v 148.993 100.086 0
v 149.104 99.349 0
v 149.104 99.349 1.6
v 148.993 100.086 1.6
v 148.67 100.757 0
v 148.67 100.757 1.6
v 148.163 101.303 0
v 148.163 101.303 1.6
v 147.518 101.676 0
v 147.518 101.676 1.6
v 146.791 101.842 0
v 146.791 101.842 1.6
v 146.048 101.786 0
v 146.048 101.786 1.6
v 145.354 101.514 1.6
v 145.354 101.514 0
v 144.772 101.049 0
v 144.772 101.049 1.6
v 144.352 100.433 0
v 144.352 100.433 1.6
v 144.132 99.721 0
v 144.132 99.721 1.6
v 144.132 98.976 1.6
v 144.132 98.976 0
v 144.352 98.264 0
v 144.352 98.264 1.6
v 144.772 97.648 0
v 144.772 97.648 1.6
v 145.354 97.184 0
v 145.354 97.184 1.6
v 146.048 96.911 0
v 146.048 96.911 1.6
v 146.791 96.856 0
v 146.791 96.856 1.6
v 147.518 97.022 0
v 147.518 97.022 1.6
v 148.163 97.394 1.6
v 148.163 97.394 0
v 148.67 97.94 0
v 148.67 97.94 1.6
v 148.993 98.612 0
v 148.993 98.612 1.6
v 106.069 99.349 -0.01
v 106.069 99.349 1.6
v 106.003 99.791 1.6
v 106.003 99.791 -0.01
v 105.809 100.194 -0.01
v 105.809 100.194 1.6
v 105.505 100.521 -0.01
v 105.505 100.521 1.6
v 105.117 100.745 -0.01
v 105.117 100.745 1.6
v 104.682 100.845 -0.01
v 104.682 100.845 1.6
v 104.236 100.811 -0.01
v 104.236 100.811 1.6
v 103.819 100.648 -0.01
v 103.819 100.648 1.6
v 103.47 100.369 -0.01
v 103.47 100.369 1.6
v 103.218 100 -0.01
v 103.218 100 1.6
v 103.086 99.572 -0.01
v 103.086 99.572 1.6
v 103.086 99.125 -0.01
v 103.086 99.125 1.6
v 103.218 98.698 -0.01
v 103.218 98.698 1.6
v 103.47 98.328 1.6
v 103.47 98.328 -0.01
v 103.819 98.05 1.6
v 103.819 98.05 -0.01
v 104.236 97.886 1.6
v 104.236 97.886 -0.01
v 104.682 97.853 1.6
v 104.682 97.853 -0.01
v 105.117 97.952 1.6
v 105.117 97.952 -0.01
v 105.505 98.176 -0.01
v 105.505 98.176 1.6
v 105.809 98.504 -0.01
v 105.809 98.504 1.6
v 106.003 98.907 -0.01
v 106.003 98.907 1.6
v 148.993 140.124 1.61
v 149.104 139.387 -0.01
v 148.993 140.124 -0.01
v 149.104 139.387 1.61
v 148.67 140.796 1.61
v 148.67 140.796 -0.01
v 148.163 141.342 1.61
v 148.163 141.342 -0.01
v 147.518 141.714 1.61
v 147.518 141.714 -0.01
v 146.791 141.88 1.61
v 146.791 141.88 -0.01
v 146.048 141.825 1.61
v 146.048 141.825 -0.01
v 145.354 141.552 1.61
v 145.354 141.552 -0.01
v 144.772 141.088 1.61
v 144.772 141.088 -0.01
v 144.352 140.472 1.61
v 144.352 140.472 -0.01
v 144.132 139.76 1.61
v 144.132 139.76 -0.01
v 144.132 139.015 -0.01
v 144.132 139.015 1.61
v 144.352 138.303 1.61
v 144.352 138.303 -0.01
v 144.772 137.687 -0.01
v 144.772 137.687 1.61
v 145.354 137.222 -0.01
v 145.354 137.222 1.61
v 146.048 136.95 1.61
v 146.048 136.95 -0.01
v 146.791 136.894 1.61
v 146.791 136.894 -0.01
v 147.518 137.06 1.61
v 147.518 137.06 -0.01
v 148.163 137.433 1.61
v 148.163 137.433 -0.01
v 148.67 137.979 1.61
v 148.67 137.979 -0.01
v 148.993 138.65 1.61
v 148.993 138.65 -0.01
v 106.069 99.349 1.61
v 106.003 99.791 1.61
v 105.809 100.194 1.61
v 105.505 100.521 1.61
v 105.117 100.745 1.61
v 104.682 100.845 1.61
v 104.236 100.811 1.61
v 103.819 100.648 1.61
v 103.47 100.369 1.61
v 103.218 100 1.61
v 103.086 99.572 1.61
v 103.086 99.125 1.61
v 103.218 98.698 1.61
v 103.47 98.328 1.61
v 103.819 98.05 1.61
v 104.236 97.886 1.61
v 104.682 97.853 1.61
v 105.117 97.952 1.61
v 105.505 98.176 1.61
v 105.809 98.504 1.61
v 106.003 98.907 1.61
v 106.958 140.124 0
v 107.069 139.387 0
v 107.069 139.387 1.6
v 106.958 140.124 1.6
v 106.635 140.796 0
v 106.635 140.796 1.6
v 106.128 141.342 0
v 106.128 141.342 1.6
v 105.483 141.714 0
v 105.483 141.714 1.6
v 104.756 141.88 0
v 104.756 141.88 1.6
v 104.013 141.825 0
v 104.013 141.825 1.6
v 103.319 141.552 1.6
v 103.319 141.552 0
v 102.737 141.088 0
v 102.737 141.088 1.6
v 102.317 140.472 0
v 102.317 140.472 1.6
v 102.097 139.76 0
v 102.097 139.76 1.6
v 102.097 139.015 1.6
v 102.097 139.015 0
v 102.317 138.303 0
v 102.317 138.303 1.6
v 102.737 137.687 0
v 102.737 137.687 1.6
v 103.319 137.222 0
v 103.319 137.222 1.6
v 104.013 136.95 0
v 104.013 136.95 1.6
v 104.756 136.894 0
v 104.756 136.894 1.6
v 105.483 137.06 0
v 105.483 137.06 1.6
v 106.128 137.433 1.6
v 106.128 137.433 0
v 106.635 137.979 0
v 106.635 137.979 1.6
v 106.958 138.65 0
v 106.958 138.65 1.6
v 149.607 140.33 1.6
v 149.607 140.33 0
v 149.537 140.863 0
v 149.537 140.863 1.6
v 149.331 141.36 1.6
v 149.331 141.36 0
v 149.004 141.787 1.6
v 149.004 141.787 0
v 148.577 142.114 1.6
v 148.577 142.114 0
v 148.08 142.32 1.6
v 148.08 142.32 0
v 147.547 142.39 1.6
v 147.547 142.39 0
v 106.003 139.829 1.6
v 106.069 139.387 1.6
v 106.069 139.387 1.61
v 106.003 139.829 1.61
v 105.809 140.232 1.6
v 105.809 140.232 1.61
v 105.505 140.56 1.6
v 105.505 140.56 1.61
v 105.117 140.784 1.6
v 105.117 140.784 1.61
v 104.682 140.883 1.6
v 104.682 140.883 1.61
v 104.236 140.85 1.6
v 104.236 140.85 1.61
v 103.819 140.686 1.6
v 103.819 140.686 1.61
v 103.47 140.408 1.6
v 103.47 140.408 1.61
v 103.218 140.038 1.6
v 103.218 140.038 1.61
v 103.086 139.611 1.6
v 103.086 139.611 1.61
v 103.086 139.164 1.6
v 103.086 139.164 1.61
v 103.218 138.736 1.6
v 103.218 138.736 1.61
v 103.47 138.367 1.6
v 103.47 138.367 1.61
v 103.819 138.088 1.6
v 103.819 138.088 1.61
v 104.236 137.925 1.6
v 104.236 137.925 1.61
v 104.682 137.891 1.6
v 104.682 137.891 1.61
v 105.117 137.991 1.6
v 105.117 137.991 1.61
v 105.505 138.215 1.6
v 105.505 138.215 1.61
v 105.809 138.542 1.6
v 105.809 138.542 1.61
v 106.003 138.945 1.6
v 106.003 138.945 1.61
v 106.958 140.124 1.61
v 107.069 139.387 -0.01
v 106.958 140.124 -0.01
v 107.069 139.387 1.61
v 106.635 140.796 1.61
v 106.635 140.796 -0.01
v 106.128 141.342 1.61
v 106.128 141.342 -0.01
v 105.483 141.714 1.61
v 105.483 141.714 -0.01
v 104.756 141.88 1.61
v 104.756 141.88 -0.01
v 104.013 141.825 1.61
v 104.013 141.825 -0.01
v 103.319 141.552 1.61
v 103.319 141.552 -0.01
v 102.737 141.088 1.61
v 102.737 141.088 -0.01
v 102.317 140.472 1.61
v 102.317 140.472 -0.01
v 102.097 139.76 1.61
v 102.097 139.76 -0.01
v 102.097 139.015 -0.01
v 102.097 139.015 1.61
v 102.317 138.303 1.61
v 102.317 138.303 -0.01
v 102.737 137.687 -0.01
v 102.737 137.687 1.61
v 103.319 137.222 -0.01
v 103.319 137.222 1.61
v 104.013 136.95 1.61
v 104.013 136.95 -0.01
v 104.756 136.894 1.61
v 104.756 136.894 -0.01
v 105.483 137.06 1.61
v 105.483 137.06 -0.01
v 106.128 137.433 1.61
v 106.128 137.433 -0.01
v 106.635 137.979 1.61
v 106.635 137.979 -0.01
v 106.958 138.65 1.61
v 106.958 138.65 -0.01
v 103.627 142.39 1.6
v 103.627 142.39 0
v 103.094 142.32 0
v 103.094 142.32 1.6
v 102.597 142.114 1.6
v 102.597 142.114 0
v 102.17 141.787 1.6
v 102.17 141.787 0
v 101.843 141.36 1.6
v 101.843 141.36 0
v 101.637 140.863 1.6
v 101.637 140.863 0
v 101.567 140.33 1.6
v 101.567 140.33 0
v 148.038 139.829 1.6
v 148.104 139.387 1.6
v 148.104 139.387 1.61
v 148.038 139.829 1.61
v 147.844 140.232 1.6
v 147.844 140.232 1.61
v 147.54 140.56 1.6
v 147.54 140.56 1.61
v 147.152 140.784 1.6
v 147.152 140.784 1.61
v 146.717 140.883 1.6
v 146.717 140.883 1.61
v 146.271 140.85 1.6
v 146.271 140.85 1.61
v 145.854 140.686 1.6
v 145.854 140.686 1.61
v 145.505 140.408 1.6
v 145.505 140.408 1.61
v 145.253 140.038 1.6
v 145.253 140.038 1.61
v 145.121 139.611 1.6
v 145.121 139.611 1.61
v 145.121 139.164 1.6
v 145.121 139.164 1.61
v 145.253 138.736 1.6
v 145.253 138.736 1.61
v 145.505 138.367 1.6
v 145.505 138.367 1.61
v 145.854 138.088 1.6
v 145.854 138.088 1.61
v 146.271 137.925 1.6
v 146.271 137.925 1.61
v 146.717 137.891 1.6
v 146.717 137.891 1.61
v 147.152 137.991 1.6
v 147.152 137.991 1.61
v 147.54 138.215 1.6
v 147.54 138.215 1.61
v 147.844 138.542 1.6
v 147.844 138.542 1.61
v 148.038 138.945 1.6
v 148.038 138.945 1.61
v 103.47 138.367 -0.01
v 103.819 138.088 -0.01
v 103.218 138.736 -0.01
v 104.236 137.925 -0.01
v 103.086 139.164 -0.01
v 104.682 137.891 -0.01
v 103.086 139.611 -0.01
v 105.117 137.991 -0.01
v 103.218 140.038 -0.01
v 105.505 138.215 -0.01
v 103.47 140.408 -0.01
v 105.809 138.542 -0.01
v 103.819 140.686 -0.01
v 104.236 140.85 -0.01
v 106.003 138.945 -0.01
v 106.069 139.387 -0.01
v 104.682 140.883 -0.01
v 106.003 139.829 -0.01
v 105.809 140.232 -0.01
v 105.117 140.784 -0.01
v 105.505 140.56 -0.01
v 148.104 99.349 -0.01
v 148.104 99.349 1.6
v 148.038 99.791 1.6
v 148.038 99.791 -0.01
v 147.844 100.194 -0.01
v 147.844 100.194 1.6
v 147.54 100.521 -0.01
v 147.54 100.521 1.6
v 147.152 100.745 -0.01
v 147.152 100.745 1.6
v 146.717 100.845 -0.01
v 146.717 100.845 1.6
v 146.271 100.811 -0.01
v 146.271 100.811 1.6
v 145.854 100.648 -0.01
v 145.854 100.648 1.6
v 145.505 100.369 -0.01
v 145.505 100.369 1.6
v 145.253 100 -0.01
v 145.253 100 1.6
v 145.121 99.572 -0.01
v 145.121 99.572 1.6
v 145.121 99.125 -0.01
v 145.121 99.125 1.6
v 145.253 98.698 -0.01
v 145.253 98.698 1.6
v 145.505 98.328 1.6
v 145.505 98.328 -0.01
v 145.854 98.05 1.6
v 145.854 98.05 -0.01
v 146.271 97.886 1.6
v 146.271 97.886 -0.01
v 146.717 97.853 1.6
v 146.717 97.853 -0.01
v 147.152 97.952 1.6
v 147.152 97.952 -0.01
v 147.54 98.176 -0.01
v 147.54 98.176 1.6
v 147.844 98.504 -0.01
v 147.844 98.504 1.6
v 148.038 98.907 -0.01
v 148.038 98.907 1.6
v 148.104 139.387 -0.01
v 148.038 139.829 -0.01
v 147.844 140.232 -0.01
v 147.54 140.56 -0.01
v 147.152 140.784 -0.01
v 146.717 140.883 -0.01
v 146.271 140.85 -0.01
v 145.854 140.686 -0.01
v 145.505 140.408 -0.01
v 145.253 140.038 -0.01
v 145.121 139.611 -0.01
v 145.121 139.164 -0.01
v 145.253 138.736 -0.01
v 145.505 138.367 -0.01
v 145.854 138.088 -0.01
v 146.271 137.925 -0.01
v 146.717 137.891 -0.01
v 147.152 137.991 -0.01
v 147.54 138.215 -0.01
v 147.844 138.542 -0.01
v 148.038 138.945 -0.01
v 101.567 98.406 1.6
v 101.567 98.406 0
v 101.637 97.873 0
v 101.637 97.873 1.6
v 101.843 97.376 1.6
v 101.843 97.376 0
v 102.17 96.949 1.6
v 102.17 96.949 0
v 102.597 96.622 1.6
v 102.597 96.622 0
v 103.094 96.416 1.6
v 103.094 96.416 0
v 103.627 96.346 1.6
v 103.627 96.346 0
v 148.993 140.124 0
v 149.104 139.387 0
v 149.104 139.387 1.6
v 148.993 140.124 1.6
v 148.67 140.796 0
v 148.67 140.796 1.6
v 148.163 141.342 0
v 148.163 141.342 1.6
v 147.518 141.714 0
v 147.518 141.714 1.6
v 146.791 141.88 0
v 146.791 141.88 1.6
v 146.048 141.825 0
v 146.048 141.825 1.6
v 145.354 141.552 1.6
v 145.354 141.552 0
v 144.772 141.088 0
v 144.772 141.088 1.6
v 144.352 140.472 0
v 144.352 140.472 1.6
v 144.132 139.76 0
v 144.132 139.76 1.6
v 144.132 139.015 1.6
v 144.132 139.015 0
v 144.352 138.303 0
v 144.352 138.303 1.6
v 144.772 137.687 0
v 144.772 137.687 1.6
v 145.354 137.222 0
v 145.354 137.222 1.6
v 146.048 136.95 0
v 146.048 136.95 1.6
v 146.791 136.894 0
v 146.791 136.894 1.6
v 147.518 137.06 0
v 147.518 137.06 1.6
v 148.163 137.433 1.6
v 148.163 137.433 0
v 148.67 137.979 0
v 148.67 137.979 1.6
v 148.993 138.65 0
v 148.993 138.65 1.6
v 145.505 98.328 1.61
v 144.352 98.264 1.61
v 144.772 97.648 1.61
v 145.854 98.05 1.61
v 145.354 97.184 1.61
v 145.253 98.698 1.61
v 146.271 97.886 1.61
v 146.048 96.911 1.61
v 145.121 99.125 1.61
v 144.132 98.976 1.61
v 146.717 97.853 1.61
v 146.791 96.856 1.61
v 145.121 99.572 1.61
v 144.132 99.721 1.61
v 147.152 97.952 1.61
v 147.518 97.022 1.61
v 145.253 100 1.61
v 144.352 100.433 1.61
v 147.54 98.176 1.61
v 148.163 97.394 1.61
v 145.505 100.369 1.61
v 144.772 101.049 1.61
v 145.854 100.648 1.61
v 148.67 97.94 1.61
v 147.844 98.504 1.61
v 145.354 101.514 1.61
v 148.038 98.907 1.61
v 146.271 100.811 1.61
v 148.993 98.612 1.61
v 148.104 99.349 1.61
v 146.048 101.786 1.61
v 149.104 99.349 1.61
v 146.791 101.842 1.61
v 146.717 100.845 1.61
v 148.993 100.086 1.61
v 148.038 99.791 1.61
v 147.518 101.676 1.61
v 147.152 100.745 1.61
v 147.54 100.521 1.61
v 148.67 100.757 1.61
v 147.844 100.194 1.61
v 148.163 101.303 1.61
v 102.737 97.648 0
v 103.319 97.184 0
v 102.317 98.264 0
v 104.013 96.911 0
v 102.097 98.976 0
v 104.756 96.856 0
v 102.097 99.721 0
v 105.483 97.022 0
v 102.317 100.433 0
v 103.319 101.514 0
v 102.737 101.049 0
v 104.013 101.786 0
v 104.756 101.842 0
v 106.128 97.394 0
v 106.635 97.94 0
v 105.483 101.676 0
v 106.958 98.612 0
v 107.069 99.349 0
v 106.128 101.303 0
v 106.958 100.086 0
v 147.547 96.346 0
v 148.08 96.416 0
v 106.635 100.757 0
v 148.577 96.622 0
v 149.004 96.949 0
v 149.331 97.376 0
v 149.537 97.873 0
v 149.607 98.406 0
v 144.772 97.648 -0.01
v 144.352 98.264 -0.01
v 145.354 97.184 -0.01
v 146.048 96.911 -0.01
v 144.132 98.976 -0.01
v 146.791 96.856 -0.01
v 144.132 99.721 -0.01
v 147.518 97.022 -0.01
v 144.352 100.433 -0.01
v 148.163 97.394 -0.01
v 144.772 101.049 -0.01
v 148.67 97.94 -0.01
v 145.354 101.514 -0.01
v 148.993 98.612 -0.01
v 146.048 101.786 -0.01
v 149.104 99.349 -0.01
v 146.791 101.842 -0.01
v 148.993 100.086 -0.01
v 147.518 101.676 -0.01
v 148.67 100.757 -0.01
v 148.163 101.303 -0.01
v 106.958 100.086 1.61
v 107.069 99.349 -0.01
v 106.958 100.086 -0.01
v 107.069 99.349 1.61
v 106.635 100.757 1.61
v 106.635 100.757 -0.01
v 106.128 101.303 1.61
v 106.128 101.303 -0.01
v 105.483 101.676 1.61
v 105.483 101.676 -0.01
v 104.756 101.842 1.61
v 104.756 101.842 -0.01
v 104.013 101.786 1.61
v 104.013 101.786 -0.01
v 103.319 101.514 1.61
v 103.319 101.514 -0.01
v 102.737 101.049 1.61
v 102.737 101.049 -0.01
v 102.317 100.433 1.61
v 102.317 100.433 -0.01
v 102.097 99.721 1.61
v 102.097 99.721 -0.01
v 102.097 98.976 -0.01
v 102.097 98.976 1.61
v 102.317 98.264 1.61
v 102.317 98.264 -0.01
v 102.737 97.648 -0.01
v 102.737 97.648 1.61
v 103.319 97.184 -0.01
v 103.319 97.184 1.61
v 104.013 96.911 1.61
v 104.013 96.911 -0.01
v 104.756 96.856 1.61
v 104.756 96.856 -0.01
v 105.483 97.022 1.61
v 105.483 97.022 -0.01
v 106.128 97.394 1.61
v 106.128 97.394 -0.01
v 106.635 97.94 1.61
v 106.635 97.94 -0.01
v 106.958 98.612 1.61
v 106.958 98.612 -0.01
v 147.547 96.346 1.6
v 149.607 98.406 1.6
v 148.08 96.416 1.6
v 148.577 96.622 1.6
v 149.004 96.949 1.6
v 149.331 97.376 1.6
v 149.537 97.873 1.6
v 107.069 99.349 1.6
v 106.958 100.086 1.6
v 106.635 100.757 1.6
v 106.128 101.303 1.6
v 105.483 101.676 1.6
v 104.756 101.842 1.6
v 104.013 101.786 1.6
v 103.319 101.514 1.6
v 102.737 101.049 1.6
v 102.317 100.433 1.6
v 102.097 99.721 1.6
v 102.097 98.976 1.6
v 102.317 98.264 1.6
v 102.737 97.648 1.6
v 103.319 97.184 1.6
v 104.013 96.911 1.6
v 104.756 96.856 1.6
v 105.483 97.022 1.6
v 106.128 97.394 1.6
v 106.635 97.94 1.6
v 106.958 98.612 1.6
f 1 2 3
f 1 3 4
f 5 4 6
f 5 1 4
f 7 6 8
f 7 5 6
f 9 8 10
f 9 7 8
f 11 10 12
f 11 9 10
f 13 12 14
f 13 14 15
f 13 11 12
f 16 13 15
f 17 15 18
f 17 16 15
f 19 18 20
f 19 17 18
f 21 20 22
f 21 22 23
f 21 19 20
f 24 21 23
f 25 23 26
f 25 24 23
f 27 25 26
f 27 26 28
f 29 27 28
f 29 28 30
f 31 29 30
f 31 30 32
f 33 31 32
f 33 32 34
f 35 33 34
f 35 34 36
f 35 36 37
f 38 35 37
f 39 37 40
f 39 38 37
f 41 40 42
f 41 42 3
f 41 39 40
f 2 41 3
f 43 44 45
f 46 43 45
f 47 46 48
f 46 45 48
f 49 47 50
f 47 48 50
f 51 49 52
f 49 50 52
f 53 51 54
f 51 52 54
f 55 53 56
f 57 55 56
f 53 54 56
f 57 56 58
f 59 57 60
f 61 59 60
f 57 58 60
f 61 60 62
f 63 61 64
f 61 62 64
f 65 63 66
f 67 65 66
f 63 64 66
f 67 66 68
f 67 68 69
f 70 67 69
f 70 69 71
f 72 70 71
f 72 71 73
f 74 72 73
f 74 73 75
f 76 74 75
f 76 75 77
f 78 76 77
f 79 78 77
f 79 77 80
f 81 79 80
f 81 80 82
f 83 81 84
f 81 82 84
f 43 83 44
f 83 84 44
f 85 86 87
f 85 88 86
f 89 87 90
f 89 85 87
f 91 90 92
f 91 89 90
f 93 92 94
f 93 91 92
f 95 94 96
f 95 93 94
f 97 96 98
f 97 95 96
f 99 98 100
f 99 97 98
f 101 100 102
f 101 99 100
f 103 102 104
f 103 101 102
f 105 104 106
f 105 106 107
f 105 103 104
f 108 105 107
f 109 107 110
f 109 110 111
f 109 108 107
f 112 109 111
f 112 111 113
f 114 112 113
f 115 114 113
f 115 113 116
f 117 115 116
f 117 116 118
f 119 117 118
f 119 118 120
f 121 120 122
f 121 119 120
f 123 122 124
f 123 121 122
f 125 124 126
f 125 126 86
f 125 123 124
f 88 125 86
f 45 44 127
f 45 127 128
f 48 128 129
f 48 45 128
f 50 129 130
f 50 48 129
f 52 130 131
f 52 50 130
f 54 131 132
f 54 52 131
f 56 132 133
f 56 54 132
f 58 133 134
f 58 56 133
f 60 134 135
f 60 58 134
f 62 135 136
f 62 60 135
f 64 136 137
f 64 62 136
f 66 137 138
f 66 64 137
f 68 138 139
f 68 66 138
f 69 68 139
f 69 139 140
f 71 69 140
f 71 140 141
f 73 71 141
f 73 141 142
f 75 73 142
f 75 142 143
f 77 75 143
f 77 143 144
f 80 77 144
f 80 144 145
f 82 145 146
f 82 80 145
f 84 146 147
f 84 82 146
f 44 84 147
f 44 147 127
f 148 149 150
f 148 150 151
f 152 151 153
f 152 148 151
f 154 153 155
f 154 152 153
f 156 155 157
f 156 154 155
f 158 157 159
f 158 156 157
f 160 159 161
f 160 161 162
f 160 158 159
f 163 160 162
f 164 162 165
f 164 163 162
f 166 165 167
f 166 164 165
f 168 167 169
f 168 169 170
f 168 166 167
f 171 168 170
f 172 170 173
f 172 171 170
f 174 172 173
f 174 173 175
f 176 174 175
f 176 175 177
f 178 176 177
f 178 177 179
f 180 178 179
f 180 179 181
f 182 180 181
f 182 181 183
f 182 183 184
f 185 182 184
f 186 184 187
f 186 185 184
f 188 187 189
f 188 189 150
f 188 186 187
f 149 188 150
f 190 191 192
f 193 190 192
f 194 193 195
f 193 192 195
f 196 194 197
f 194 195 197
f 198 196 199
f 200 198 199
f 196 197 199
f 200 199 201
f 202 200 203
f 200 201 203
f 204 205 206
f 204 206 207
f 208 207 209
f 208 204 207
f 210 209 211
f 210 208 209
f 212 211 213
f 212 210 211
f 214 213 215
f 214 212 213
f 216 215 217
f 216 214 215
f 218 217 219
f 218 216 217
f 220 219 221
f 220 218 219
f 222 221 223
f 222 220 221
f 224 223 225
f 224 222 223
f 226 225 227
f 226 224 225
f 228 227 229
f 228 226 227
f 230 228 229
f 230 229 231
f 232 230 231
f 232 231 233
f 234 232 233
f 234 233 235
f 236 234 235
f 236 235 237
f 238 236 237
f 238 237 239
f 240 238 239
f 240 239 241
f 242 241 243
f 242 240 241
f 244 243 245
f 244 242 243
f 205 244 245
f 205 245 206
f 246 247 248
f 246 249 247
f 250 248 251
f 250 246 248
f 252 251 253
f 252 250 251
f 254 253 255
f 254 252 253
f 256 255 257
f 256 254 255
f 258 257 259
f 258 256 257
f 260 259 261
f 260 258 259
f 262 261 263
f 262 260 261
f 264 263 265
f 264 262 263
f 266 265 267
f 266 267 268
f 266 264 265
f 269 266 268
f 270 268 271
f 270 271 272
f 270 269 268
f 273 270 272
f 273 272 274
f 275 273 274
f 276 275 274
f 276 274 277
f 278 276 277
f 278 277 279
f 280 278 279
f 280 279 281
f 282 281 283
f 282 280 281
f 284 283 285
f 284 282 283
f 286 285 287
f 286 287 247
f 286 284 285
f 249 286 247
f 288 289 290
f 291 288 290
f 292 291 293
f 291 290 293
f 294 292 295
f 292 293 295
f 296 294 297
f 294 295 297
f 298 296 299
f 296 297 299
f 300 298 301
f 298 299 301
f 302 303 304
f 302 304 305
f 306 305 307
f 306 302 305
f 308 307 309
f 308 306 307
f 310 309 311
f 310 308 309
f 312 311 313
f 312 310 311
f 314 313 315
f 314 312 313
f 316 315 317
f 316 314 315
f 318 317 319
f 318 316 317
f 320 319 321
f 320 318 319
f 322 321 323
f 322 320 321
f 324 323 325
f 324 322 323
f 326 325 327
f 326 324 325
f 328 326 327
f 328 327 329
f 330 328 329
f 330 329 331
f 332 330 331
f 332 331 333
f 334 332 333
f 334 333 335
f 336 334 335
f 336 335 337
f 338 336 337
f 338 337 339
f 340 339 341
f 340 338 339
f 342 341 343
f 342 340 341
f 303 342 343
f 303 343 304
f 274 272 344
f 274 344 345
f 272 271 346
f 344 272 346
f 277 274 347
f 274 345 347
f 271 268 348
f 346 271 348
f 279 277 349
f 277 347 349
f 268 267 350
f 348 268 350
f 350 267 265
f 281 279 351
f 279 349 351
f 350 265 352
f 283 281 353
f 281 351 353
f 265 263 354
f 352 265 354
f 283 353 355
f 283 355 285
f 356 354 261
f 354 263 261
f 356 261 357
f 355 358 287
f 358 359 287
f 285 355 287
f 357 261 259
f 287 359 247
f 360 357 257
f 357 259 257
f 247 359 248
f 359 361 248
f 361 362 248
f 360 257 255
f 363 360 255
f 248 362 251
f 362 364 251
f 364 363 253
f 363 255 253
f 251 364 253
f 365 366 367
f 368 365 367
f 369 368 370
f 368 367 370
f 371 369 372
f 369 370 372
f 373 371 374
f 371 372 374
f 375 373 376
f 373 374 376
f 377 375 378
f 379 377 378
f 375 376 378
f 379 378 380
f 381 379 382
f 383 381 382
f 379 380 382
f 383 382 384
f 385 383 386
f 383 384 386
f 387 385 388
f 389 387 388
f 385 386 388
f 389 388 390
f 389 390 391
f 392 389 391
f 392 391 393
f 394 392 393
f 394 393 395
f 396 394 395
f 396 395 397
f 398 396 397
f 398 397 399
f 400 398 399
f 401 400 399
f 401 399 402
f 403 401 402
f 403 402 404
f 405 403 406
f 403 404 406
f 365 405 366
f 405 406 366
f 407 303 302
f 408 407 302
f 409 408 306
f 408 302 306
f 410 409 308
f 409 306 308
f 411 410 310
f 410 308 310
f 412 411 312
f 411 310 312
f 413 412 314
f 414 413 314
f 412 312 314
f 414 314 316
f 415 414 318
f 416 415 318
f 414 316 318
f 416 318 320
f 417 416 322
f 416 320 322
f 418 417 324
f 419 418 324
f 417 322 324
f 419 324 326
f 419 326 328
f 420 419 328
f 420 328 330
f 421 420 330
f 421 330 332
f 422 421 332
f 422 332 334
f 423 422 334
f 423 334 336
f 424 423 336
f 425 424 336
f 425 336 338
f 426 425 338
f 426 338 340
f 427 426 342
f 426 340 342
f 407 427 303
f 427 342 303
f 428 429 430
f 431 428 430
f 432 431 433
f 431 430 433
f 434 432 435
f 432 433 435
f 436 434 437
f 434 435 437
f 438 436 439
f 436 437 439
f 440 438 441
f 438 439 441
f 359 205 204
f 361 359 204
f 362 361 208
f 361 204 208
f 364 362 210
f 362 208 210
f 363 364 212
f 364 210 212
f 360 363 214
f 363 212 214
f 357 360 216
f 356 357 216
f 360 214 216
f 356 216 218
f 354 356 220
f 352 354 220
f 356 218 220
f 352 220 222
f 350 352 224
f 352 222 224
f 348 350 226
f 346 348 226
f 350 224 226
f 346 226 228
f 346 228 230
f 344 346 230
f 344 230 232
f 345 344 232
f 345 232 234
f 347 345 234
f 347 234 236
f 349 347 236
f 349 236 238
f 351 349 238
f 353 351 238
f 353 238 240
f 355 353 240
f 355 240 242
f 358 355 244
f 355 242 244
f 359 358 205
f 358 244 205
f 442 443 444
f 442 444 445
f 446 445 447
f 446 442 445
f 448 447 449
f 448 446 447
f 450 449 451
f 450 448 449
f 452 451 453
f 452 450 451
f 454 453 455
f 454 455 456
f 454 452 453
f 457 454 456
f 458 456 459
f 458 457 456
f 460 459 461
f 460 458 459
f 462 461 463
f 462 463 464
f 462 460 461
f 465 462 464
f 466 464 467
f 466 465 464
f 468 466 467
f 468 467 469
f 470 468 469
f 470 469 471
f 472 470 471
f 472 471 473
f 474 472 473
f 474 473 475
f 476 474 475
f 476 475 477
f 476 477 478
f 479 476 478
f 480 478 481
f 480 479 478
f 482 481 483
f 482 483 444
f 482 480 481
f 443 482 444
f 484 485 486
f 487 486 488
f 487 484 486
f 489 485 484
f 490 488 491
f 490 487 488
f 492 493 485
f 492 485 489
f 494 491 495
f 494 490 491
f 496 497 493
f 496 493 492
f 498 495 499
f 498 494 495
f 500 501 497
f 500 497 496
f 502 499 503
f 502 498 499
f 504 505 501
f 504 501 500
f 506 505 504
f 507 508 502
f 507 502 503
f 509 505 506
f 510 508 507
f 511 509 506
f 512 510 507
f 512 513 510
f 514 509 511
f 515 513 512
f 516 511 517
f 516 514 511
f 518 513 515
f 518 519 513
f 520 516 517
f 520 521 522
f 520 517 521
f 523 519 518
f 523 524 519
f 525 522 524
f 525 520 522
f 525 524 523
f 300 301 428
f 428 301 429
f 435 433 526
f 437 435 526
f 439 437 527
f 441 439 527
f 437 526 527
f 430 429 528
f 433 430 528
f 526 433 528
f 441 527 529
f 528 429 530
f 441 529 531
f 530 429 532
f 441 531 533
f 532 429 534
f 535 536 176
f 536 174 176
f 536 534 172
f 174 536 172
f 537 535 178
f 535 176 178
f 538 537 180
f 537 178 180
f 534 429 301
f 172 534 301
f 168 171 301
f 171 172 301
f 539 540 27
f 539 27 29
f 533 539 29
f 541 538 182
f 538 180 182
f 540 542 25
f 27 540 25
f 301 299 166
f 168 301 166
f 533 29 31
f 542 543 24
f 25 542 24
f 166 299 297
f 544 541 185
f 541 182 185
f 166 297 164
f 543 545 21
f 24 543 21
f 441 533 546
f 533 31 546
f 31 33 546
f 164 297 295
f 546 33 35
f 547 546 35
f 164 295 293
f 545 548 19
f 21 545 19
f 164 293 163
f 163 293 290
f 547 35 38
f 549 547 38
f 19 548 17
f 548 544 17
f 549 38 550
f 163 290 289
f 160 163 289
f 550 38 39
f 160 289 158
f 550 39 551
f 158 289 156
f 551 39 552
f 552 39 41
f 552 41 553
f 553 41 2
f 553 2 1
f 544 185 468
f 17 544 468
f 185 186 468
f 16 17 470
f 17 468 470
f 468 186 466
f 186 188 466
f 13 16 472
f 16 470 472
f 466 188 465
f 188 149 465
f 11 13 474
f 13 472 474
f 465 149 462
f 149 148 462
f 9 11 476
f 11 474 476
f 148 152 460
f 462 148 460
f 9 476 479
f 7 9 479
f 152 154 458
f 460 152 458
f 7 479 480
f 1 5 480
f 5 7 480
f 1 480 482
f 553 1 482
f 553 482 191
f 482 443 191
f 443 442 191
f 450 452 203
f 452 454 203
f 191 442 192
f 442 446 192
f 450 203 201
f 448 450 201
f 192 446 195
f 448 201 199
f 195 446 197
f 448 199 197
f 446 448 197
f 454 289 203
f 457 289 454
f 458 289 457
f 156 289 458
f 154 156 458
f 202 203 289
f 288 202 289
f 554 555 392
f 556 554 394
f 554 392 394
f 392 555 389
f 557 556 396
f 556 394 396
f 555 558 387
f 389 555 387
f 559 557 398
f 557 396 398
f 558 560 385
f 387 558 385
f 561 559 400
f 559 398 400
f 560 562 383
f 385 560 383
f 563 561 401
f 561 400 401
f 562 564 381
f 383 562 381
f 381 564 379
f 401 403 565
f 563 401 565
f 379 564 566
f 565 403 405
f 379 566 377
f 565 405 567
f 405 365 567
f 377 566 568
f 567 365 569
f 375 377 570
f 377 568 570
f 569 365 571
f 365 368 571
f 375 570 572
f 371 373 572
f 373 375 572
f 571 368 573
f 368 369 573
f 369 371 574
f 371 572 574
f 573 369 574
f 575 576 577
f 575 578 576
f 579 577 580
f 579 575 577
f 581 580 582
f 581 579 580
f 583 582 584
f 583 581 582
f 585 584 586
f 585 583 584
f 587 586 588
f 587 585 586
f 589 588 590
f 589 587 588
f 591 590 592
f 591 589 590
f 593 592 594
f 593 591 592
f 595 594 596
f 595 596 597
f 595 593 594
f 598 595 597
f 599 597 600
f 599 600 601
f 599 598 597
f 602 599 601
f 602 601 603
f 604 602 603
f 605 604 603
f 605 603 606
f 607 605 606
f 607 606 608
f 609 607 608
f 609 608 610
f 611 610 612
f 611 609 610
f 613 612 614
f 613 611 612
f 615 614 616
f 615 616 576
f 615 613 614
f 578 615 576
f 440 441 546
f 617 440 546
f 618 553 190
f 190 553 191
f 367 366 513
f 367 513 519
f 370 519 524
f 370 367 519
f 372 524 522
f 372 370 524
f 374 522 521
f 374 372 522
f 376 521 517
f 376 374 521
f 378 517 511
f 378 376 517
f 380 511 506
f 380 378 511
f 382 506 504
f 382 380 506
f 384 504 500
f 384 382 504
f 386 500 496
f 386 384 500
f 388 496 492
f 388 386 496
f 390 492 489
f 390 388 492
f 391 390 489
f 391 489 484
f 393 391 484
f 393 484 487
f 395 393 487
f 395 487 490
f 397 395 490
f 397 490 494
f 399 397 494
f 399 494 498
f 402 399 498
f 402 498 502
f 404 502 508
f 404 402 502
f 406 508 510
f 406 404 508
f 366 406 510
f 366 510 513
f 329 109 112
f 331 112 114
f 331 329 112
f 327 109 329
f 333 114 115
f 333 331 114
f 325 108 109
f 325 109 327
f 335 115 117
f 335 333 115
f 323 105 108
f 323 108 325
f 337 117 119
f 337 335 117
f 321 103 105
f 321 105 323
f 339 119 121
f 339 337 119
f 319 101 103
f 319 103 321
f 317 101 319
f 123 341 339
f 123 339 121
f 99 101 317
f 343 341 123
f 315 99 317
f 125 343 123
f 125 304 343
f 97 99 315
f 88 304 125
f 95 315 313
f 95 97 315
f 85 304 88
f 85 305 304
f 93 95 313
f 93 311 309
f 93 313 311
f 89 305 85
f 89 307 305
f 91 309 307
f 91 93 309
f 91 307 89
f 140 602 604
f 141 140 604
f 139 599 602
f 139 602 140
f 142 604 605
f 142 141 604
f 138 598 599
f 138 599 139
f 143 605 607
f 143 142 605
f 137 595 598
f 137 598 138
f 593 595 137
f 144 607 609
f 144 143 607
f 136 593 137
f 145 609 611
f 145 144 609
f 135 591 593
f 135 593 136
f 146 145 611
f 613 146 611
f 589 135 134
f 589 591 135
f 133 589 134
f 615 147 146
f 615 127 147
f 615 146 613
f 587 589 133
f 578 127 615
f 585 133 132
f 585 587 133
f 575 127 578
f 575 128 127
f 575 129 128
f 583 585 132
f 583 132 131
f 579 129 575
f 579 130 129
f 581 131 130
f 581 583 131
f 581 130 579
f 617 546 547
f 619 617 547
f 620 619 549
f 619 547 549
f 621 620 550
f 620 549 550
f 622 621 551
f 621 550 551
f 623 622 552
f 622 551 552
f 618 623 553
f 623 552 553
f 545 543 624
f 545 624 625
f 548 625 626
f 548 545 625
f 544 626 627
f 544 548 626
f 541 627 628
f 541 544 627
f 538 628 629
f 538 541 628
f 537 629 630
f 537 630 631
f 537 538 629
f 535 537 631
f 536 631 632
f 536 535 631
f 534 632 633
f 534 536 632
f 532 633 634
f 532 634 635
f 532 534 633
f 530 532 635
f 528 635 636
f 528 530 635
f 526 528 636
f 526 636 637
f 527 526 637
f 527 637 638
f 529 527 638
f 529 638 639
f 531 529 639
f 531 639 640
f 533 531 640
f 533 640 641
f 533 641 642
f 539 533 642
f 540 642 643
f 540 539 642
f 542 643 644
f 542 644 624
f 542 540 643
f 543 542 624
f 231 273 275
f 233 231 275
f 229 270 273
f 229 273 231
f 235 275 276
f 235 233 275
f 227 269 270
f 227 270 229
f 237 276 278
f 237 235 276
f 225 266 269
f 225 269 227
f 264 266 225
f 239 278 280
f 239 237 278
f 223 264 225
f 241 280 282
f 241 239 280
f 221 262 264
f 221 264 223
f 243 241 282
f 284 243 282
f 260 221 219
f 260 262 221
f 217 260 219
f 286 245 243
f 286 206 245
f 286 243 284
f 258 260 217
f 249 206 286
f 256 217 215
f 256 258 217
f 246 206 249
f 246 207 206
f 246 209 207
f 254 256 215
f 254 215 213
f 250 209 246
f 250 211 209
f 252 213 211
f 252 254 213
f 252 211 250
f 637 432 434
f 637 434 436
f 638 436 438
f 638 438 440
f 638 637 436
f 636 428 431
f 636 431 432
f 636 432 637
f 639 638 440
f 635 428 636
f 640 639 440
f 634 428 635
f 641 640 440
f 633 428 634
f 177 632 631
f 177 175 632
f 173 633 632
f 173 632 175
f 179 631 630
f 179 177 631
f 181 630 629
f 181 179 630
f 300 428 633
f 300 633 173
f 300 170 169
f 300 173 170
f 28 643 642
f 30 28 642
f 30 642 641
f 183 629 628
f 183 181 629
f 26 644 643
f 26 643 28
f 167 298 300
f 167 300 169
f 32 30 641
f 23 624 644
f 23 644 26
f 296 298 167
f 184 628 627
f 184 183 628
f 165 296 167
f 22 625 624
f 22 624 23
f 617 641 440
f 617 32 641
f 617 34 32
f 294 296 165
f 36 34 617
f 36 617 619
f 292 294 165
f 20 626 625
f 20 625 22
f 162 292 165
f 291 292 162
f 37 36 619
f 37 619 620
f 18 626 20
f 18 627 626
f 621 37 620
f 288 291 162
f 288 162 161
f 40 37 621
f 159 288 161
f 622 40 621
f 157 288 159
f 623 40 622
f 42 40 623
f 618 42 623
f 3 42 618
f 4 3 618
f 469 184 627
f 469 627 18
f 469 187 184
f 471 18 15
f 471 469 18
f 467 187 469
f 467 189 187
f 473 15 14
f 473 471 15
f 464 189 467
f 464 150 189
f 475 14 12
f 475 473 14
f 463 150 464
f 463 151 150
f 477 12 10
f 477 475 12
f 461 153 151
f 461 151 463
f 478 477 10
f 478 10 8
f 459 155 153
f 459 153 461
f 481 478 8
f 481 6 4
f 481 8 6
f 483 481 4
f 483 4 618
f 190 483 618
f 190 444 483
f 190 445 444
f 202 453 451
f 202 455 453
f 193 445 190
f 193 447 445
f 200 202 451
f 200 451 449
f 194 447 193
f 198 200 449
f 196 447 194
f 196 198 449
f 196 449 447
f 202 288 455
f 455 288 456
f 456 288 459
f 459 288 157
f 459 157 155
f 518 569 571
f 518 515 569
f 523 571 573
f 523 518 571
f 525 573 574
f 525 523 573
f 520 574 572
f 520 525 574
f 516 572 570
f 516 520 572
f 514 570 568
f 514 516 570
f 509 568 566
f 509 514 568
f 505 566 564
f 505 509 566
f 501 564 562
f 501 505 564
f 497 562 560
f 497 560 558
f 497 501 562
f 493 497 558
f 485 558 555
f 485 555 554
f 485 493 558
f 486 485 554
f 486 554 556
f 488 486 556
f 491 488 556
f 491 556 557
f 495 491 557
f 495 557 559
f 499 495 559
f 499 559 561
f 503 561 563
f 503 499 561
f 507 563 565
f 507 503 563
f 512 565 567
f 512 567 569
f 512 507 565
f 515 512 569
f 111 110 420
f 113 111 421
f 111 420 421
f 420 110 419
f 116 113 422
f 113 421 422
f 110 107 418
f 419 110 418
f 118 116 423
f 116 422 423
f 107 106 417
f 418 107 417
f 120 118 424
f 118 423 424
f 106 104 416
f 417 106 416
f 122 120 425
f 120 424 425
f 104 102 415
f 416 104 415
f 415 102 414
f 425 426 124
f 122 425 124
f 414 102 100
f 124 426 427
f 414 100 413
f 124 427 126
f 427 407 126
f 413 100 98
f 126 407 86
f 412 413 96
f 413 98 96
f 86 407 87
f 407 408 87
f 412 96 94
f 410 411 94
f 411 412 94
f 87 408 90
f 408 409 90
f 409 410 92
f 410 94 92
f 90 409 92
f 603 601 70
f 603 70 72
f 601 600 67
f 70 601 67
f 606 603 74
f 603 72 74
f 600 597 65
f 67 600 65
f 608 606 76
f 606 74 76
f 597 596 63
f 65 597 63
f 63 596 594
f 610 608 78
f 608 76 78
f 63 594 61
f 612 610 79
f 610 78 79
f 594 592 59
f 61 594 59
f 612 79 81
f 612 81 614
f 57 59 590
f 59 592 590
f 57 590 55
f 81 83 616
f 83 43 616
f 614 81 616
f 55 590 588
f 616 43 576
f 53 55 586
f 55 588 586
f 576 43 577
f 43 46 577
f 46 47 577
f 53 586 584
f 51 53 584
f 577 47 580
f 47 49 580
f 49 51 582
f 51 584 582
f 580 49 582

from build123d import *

# Parameters (mm, degrees)
BG_OUTLINE_R                   = 2.5
SALIENTE_EXTRUIR1_DEPTH        = 1.6
CROQUIS5_R                     = 2.5
CROQUIS5_R_2                   = 1.5
SALIENTE_EXTRUIR2_DEPTH        = 0.01
SALIENTE_EXTRUIR2_DEPTH_BACK   = 1.61
SALIENTE_EXTRUIR2_2_DEPTH      = 0.01
SALIENTE_EXTRUIR2_2_DEPTH_BACK = 1.61
SALIENTE_EXTRUIR2_3_DEPTH      = 0.01
SALIENTE_EXTRUIR2_3_DEPTH_BACK = 1.61
SALIENTE_EXTRUIR2_4_DEPTH      = 0.01
SALIENTE_EXTRUIR2_4_DEPTH_BACK = 1.61


with BuildPart() as part:
    # BG_OUTLINE → Saliente-Extruir1 (new body)
    with BuildSketch(Plane.XY):
        with BuildLine():
            Line((101.566907906, 140.330081796), (101.566907906, 98.405907128))
            ThreePointArc((101.566907906, 98.405907128), (102.170201979, 96.949426394), (103.626682714, 96.34613232))
            Line((103.626682714, 96.34613232), (147.547246656, 96.34613232))
            ThreePointArc((147.547246656, 96.34613232), (149.00372739, 96.949426394), (149.607021464, 98.405907128))
            Line((149.607021464, 98.405907128), (149.607021464, 140.330081796))
            ThreePointArc((149.607021464, 140.330081796), (149.00372739, 141.78656253), (147.547246656, 142.389856604))
            Line((147.547246656, 142.389856604), (103.626682714, 142.389856604))
            ThreePointArc((103.626682714, 142.389856604), (102.170201979, 141.78656253), (101.566907906, 140.330081796))
        make_face()
        with Locations((146.604450981, 139.387286121)):
            Circle(BG_OUTLINE_R, mode=Mode.SUBTRACT)
        with Locations((104.569478389, 139.387286121)):
            Circle(BG_OUTLINE_R, mode=Mode.SUBTRACT)
        with Locations((104.569478389, 99.348702803)):
            Circle(BG_OUTLINE_R, mode=Mode.SUBTRACT)
        with Locations((146.604450981, 99.348702803)):
            Circle(BG_OUTLINE_R, mode=Mode.SUBTRACT)
    extrude(amount=SALIENTE_EXTRUIR1_DEPTH)


with BuildPart() as body_2:
    # Croquis5 → Saliente-Extruir2 (new body, two sides)
    with BuildSketch(Plane.XY.offset(1.6)) as saliente_extruir2_sk:
        with Locations((146.604450981, 139.387286121)):
            Circle(CROQUIS5_R)
        with Locations((146.604450981, 139.387286121)):
            Circle(CROQUIS5_R_2, mode=Mode.SUBTRACT)
    extrude(amount=SALIENTE_EXTRUIR2_DEPTH)
    extrude(saliente_extruir2_sk.sketch, amount=-SALIENTE_EXTRUIR2_DEPTH_BACK)


with BuildPart() as body_3:
    # Croquis5 → Saliente-Extruir2 2 (new body, two sides)
    with BuildSketch(Plane.XY.offset(1.6)) as saliente_extruir2_2_sk:
        with Locations((104.569478389, 139.387286121)):
            Circle(CROQUIS5_R)
        with Locations((104.569478389, 139.387286121)):
            Circle(CROQUIS5_R_2, mode=Mode.SUBTRACT)
    extrude(amount=SALIENTE_EXTRUIR2_2_DEPTH)
    extrude(saliente_extruir2_2_sk.sketch, amount=-SALIENTE_EXTRUIR2_2_DEPTH_BACK)


with BuildPart() as body_4:
    # Croquis5 → Saliente-Extruir2 3 (new body, two sides)
    with BuildSketch(Plane.XY.offset(1.6)) as saliente_extruir2_3_sk:
        with Locations((104.569478389, 99.348702803)):
            Circle(CROQUIS5_R)
        with Locations((104.569478389, 99.348702803)):
            Circle(CROQUIS5_R_2, mode=Mode.SUBTRACT)
    extrude(amount=SALIENTE_EXTRUIR2_3_DEPTH)
    extrude(saliente_extruir2_3_sk.sketch, amount=-SALIENTE_EXTRUIR2_3_DEPTH_BACK)


with BuildPart() as body_5:
    # Croquis5 → Saliente-Extruir2 4 (new body, two sides)
    with BuildSketch(Plane.XY.offset(1.6)) as saliente_extruir2_4_sk:
        with Locations((146.604450981, 99.348702803)):
            Circle(CROQUIS5_R)
        with Locations((146.604450981, 99.348702803)):
            Circle(CROQUIS5_R_2, mode=Mode.SUBTRACT)
    extrude(amount=SALIENTE_EXTRUIR2_4_DEPTH)
    extrude(saliente_extruir2_4_sk.sketch, amount=-SALIENTE_EXTRUIR2_4_DEPTH_BACK)


solid = Compound([part.part, body_2.part, body_3.part, body_4.part, body_5.part])
